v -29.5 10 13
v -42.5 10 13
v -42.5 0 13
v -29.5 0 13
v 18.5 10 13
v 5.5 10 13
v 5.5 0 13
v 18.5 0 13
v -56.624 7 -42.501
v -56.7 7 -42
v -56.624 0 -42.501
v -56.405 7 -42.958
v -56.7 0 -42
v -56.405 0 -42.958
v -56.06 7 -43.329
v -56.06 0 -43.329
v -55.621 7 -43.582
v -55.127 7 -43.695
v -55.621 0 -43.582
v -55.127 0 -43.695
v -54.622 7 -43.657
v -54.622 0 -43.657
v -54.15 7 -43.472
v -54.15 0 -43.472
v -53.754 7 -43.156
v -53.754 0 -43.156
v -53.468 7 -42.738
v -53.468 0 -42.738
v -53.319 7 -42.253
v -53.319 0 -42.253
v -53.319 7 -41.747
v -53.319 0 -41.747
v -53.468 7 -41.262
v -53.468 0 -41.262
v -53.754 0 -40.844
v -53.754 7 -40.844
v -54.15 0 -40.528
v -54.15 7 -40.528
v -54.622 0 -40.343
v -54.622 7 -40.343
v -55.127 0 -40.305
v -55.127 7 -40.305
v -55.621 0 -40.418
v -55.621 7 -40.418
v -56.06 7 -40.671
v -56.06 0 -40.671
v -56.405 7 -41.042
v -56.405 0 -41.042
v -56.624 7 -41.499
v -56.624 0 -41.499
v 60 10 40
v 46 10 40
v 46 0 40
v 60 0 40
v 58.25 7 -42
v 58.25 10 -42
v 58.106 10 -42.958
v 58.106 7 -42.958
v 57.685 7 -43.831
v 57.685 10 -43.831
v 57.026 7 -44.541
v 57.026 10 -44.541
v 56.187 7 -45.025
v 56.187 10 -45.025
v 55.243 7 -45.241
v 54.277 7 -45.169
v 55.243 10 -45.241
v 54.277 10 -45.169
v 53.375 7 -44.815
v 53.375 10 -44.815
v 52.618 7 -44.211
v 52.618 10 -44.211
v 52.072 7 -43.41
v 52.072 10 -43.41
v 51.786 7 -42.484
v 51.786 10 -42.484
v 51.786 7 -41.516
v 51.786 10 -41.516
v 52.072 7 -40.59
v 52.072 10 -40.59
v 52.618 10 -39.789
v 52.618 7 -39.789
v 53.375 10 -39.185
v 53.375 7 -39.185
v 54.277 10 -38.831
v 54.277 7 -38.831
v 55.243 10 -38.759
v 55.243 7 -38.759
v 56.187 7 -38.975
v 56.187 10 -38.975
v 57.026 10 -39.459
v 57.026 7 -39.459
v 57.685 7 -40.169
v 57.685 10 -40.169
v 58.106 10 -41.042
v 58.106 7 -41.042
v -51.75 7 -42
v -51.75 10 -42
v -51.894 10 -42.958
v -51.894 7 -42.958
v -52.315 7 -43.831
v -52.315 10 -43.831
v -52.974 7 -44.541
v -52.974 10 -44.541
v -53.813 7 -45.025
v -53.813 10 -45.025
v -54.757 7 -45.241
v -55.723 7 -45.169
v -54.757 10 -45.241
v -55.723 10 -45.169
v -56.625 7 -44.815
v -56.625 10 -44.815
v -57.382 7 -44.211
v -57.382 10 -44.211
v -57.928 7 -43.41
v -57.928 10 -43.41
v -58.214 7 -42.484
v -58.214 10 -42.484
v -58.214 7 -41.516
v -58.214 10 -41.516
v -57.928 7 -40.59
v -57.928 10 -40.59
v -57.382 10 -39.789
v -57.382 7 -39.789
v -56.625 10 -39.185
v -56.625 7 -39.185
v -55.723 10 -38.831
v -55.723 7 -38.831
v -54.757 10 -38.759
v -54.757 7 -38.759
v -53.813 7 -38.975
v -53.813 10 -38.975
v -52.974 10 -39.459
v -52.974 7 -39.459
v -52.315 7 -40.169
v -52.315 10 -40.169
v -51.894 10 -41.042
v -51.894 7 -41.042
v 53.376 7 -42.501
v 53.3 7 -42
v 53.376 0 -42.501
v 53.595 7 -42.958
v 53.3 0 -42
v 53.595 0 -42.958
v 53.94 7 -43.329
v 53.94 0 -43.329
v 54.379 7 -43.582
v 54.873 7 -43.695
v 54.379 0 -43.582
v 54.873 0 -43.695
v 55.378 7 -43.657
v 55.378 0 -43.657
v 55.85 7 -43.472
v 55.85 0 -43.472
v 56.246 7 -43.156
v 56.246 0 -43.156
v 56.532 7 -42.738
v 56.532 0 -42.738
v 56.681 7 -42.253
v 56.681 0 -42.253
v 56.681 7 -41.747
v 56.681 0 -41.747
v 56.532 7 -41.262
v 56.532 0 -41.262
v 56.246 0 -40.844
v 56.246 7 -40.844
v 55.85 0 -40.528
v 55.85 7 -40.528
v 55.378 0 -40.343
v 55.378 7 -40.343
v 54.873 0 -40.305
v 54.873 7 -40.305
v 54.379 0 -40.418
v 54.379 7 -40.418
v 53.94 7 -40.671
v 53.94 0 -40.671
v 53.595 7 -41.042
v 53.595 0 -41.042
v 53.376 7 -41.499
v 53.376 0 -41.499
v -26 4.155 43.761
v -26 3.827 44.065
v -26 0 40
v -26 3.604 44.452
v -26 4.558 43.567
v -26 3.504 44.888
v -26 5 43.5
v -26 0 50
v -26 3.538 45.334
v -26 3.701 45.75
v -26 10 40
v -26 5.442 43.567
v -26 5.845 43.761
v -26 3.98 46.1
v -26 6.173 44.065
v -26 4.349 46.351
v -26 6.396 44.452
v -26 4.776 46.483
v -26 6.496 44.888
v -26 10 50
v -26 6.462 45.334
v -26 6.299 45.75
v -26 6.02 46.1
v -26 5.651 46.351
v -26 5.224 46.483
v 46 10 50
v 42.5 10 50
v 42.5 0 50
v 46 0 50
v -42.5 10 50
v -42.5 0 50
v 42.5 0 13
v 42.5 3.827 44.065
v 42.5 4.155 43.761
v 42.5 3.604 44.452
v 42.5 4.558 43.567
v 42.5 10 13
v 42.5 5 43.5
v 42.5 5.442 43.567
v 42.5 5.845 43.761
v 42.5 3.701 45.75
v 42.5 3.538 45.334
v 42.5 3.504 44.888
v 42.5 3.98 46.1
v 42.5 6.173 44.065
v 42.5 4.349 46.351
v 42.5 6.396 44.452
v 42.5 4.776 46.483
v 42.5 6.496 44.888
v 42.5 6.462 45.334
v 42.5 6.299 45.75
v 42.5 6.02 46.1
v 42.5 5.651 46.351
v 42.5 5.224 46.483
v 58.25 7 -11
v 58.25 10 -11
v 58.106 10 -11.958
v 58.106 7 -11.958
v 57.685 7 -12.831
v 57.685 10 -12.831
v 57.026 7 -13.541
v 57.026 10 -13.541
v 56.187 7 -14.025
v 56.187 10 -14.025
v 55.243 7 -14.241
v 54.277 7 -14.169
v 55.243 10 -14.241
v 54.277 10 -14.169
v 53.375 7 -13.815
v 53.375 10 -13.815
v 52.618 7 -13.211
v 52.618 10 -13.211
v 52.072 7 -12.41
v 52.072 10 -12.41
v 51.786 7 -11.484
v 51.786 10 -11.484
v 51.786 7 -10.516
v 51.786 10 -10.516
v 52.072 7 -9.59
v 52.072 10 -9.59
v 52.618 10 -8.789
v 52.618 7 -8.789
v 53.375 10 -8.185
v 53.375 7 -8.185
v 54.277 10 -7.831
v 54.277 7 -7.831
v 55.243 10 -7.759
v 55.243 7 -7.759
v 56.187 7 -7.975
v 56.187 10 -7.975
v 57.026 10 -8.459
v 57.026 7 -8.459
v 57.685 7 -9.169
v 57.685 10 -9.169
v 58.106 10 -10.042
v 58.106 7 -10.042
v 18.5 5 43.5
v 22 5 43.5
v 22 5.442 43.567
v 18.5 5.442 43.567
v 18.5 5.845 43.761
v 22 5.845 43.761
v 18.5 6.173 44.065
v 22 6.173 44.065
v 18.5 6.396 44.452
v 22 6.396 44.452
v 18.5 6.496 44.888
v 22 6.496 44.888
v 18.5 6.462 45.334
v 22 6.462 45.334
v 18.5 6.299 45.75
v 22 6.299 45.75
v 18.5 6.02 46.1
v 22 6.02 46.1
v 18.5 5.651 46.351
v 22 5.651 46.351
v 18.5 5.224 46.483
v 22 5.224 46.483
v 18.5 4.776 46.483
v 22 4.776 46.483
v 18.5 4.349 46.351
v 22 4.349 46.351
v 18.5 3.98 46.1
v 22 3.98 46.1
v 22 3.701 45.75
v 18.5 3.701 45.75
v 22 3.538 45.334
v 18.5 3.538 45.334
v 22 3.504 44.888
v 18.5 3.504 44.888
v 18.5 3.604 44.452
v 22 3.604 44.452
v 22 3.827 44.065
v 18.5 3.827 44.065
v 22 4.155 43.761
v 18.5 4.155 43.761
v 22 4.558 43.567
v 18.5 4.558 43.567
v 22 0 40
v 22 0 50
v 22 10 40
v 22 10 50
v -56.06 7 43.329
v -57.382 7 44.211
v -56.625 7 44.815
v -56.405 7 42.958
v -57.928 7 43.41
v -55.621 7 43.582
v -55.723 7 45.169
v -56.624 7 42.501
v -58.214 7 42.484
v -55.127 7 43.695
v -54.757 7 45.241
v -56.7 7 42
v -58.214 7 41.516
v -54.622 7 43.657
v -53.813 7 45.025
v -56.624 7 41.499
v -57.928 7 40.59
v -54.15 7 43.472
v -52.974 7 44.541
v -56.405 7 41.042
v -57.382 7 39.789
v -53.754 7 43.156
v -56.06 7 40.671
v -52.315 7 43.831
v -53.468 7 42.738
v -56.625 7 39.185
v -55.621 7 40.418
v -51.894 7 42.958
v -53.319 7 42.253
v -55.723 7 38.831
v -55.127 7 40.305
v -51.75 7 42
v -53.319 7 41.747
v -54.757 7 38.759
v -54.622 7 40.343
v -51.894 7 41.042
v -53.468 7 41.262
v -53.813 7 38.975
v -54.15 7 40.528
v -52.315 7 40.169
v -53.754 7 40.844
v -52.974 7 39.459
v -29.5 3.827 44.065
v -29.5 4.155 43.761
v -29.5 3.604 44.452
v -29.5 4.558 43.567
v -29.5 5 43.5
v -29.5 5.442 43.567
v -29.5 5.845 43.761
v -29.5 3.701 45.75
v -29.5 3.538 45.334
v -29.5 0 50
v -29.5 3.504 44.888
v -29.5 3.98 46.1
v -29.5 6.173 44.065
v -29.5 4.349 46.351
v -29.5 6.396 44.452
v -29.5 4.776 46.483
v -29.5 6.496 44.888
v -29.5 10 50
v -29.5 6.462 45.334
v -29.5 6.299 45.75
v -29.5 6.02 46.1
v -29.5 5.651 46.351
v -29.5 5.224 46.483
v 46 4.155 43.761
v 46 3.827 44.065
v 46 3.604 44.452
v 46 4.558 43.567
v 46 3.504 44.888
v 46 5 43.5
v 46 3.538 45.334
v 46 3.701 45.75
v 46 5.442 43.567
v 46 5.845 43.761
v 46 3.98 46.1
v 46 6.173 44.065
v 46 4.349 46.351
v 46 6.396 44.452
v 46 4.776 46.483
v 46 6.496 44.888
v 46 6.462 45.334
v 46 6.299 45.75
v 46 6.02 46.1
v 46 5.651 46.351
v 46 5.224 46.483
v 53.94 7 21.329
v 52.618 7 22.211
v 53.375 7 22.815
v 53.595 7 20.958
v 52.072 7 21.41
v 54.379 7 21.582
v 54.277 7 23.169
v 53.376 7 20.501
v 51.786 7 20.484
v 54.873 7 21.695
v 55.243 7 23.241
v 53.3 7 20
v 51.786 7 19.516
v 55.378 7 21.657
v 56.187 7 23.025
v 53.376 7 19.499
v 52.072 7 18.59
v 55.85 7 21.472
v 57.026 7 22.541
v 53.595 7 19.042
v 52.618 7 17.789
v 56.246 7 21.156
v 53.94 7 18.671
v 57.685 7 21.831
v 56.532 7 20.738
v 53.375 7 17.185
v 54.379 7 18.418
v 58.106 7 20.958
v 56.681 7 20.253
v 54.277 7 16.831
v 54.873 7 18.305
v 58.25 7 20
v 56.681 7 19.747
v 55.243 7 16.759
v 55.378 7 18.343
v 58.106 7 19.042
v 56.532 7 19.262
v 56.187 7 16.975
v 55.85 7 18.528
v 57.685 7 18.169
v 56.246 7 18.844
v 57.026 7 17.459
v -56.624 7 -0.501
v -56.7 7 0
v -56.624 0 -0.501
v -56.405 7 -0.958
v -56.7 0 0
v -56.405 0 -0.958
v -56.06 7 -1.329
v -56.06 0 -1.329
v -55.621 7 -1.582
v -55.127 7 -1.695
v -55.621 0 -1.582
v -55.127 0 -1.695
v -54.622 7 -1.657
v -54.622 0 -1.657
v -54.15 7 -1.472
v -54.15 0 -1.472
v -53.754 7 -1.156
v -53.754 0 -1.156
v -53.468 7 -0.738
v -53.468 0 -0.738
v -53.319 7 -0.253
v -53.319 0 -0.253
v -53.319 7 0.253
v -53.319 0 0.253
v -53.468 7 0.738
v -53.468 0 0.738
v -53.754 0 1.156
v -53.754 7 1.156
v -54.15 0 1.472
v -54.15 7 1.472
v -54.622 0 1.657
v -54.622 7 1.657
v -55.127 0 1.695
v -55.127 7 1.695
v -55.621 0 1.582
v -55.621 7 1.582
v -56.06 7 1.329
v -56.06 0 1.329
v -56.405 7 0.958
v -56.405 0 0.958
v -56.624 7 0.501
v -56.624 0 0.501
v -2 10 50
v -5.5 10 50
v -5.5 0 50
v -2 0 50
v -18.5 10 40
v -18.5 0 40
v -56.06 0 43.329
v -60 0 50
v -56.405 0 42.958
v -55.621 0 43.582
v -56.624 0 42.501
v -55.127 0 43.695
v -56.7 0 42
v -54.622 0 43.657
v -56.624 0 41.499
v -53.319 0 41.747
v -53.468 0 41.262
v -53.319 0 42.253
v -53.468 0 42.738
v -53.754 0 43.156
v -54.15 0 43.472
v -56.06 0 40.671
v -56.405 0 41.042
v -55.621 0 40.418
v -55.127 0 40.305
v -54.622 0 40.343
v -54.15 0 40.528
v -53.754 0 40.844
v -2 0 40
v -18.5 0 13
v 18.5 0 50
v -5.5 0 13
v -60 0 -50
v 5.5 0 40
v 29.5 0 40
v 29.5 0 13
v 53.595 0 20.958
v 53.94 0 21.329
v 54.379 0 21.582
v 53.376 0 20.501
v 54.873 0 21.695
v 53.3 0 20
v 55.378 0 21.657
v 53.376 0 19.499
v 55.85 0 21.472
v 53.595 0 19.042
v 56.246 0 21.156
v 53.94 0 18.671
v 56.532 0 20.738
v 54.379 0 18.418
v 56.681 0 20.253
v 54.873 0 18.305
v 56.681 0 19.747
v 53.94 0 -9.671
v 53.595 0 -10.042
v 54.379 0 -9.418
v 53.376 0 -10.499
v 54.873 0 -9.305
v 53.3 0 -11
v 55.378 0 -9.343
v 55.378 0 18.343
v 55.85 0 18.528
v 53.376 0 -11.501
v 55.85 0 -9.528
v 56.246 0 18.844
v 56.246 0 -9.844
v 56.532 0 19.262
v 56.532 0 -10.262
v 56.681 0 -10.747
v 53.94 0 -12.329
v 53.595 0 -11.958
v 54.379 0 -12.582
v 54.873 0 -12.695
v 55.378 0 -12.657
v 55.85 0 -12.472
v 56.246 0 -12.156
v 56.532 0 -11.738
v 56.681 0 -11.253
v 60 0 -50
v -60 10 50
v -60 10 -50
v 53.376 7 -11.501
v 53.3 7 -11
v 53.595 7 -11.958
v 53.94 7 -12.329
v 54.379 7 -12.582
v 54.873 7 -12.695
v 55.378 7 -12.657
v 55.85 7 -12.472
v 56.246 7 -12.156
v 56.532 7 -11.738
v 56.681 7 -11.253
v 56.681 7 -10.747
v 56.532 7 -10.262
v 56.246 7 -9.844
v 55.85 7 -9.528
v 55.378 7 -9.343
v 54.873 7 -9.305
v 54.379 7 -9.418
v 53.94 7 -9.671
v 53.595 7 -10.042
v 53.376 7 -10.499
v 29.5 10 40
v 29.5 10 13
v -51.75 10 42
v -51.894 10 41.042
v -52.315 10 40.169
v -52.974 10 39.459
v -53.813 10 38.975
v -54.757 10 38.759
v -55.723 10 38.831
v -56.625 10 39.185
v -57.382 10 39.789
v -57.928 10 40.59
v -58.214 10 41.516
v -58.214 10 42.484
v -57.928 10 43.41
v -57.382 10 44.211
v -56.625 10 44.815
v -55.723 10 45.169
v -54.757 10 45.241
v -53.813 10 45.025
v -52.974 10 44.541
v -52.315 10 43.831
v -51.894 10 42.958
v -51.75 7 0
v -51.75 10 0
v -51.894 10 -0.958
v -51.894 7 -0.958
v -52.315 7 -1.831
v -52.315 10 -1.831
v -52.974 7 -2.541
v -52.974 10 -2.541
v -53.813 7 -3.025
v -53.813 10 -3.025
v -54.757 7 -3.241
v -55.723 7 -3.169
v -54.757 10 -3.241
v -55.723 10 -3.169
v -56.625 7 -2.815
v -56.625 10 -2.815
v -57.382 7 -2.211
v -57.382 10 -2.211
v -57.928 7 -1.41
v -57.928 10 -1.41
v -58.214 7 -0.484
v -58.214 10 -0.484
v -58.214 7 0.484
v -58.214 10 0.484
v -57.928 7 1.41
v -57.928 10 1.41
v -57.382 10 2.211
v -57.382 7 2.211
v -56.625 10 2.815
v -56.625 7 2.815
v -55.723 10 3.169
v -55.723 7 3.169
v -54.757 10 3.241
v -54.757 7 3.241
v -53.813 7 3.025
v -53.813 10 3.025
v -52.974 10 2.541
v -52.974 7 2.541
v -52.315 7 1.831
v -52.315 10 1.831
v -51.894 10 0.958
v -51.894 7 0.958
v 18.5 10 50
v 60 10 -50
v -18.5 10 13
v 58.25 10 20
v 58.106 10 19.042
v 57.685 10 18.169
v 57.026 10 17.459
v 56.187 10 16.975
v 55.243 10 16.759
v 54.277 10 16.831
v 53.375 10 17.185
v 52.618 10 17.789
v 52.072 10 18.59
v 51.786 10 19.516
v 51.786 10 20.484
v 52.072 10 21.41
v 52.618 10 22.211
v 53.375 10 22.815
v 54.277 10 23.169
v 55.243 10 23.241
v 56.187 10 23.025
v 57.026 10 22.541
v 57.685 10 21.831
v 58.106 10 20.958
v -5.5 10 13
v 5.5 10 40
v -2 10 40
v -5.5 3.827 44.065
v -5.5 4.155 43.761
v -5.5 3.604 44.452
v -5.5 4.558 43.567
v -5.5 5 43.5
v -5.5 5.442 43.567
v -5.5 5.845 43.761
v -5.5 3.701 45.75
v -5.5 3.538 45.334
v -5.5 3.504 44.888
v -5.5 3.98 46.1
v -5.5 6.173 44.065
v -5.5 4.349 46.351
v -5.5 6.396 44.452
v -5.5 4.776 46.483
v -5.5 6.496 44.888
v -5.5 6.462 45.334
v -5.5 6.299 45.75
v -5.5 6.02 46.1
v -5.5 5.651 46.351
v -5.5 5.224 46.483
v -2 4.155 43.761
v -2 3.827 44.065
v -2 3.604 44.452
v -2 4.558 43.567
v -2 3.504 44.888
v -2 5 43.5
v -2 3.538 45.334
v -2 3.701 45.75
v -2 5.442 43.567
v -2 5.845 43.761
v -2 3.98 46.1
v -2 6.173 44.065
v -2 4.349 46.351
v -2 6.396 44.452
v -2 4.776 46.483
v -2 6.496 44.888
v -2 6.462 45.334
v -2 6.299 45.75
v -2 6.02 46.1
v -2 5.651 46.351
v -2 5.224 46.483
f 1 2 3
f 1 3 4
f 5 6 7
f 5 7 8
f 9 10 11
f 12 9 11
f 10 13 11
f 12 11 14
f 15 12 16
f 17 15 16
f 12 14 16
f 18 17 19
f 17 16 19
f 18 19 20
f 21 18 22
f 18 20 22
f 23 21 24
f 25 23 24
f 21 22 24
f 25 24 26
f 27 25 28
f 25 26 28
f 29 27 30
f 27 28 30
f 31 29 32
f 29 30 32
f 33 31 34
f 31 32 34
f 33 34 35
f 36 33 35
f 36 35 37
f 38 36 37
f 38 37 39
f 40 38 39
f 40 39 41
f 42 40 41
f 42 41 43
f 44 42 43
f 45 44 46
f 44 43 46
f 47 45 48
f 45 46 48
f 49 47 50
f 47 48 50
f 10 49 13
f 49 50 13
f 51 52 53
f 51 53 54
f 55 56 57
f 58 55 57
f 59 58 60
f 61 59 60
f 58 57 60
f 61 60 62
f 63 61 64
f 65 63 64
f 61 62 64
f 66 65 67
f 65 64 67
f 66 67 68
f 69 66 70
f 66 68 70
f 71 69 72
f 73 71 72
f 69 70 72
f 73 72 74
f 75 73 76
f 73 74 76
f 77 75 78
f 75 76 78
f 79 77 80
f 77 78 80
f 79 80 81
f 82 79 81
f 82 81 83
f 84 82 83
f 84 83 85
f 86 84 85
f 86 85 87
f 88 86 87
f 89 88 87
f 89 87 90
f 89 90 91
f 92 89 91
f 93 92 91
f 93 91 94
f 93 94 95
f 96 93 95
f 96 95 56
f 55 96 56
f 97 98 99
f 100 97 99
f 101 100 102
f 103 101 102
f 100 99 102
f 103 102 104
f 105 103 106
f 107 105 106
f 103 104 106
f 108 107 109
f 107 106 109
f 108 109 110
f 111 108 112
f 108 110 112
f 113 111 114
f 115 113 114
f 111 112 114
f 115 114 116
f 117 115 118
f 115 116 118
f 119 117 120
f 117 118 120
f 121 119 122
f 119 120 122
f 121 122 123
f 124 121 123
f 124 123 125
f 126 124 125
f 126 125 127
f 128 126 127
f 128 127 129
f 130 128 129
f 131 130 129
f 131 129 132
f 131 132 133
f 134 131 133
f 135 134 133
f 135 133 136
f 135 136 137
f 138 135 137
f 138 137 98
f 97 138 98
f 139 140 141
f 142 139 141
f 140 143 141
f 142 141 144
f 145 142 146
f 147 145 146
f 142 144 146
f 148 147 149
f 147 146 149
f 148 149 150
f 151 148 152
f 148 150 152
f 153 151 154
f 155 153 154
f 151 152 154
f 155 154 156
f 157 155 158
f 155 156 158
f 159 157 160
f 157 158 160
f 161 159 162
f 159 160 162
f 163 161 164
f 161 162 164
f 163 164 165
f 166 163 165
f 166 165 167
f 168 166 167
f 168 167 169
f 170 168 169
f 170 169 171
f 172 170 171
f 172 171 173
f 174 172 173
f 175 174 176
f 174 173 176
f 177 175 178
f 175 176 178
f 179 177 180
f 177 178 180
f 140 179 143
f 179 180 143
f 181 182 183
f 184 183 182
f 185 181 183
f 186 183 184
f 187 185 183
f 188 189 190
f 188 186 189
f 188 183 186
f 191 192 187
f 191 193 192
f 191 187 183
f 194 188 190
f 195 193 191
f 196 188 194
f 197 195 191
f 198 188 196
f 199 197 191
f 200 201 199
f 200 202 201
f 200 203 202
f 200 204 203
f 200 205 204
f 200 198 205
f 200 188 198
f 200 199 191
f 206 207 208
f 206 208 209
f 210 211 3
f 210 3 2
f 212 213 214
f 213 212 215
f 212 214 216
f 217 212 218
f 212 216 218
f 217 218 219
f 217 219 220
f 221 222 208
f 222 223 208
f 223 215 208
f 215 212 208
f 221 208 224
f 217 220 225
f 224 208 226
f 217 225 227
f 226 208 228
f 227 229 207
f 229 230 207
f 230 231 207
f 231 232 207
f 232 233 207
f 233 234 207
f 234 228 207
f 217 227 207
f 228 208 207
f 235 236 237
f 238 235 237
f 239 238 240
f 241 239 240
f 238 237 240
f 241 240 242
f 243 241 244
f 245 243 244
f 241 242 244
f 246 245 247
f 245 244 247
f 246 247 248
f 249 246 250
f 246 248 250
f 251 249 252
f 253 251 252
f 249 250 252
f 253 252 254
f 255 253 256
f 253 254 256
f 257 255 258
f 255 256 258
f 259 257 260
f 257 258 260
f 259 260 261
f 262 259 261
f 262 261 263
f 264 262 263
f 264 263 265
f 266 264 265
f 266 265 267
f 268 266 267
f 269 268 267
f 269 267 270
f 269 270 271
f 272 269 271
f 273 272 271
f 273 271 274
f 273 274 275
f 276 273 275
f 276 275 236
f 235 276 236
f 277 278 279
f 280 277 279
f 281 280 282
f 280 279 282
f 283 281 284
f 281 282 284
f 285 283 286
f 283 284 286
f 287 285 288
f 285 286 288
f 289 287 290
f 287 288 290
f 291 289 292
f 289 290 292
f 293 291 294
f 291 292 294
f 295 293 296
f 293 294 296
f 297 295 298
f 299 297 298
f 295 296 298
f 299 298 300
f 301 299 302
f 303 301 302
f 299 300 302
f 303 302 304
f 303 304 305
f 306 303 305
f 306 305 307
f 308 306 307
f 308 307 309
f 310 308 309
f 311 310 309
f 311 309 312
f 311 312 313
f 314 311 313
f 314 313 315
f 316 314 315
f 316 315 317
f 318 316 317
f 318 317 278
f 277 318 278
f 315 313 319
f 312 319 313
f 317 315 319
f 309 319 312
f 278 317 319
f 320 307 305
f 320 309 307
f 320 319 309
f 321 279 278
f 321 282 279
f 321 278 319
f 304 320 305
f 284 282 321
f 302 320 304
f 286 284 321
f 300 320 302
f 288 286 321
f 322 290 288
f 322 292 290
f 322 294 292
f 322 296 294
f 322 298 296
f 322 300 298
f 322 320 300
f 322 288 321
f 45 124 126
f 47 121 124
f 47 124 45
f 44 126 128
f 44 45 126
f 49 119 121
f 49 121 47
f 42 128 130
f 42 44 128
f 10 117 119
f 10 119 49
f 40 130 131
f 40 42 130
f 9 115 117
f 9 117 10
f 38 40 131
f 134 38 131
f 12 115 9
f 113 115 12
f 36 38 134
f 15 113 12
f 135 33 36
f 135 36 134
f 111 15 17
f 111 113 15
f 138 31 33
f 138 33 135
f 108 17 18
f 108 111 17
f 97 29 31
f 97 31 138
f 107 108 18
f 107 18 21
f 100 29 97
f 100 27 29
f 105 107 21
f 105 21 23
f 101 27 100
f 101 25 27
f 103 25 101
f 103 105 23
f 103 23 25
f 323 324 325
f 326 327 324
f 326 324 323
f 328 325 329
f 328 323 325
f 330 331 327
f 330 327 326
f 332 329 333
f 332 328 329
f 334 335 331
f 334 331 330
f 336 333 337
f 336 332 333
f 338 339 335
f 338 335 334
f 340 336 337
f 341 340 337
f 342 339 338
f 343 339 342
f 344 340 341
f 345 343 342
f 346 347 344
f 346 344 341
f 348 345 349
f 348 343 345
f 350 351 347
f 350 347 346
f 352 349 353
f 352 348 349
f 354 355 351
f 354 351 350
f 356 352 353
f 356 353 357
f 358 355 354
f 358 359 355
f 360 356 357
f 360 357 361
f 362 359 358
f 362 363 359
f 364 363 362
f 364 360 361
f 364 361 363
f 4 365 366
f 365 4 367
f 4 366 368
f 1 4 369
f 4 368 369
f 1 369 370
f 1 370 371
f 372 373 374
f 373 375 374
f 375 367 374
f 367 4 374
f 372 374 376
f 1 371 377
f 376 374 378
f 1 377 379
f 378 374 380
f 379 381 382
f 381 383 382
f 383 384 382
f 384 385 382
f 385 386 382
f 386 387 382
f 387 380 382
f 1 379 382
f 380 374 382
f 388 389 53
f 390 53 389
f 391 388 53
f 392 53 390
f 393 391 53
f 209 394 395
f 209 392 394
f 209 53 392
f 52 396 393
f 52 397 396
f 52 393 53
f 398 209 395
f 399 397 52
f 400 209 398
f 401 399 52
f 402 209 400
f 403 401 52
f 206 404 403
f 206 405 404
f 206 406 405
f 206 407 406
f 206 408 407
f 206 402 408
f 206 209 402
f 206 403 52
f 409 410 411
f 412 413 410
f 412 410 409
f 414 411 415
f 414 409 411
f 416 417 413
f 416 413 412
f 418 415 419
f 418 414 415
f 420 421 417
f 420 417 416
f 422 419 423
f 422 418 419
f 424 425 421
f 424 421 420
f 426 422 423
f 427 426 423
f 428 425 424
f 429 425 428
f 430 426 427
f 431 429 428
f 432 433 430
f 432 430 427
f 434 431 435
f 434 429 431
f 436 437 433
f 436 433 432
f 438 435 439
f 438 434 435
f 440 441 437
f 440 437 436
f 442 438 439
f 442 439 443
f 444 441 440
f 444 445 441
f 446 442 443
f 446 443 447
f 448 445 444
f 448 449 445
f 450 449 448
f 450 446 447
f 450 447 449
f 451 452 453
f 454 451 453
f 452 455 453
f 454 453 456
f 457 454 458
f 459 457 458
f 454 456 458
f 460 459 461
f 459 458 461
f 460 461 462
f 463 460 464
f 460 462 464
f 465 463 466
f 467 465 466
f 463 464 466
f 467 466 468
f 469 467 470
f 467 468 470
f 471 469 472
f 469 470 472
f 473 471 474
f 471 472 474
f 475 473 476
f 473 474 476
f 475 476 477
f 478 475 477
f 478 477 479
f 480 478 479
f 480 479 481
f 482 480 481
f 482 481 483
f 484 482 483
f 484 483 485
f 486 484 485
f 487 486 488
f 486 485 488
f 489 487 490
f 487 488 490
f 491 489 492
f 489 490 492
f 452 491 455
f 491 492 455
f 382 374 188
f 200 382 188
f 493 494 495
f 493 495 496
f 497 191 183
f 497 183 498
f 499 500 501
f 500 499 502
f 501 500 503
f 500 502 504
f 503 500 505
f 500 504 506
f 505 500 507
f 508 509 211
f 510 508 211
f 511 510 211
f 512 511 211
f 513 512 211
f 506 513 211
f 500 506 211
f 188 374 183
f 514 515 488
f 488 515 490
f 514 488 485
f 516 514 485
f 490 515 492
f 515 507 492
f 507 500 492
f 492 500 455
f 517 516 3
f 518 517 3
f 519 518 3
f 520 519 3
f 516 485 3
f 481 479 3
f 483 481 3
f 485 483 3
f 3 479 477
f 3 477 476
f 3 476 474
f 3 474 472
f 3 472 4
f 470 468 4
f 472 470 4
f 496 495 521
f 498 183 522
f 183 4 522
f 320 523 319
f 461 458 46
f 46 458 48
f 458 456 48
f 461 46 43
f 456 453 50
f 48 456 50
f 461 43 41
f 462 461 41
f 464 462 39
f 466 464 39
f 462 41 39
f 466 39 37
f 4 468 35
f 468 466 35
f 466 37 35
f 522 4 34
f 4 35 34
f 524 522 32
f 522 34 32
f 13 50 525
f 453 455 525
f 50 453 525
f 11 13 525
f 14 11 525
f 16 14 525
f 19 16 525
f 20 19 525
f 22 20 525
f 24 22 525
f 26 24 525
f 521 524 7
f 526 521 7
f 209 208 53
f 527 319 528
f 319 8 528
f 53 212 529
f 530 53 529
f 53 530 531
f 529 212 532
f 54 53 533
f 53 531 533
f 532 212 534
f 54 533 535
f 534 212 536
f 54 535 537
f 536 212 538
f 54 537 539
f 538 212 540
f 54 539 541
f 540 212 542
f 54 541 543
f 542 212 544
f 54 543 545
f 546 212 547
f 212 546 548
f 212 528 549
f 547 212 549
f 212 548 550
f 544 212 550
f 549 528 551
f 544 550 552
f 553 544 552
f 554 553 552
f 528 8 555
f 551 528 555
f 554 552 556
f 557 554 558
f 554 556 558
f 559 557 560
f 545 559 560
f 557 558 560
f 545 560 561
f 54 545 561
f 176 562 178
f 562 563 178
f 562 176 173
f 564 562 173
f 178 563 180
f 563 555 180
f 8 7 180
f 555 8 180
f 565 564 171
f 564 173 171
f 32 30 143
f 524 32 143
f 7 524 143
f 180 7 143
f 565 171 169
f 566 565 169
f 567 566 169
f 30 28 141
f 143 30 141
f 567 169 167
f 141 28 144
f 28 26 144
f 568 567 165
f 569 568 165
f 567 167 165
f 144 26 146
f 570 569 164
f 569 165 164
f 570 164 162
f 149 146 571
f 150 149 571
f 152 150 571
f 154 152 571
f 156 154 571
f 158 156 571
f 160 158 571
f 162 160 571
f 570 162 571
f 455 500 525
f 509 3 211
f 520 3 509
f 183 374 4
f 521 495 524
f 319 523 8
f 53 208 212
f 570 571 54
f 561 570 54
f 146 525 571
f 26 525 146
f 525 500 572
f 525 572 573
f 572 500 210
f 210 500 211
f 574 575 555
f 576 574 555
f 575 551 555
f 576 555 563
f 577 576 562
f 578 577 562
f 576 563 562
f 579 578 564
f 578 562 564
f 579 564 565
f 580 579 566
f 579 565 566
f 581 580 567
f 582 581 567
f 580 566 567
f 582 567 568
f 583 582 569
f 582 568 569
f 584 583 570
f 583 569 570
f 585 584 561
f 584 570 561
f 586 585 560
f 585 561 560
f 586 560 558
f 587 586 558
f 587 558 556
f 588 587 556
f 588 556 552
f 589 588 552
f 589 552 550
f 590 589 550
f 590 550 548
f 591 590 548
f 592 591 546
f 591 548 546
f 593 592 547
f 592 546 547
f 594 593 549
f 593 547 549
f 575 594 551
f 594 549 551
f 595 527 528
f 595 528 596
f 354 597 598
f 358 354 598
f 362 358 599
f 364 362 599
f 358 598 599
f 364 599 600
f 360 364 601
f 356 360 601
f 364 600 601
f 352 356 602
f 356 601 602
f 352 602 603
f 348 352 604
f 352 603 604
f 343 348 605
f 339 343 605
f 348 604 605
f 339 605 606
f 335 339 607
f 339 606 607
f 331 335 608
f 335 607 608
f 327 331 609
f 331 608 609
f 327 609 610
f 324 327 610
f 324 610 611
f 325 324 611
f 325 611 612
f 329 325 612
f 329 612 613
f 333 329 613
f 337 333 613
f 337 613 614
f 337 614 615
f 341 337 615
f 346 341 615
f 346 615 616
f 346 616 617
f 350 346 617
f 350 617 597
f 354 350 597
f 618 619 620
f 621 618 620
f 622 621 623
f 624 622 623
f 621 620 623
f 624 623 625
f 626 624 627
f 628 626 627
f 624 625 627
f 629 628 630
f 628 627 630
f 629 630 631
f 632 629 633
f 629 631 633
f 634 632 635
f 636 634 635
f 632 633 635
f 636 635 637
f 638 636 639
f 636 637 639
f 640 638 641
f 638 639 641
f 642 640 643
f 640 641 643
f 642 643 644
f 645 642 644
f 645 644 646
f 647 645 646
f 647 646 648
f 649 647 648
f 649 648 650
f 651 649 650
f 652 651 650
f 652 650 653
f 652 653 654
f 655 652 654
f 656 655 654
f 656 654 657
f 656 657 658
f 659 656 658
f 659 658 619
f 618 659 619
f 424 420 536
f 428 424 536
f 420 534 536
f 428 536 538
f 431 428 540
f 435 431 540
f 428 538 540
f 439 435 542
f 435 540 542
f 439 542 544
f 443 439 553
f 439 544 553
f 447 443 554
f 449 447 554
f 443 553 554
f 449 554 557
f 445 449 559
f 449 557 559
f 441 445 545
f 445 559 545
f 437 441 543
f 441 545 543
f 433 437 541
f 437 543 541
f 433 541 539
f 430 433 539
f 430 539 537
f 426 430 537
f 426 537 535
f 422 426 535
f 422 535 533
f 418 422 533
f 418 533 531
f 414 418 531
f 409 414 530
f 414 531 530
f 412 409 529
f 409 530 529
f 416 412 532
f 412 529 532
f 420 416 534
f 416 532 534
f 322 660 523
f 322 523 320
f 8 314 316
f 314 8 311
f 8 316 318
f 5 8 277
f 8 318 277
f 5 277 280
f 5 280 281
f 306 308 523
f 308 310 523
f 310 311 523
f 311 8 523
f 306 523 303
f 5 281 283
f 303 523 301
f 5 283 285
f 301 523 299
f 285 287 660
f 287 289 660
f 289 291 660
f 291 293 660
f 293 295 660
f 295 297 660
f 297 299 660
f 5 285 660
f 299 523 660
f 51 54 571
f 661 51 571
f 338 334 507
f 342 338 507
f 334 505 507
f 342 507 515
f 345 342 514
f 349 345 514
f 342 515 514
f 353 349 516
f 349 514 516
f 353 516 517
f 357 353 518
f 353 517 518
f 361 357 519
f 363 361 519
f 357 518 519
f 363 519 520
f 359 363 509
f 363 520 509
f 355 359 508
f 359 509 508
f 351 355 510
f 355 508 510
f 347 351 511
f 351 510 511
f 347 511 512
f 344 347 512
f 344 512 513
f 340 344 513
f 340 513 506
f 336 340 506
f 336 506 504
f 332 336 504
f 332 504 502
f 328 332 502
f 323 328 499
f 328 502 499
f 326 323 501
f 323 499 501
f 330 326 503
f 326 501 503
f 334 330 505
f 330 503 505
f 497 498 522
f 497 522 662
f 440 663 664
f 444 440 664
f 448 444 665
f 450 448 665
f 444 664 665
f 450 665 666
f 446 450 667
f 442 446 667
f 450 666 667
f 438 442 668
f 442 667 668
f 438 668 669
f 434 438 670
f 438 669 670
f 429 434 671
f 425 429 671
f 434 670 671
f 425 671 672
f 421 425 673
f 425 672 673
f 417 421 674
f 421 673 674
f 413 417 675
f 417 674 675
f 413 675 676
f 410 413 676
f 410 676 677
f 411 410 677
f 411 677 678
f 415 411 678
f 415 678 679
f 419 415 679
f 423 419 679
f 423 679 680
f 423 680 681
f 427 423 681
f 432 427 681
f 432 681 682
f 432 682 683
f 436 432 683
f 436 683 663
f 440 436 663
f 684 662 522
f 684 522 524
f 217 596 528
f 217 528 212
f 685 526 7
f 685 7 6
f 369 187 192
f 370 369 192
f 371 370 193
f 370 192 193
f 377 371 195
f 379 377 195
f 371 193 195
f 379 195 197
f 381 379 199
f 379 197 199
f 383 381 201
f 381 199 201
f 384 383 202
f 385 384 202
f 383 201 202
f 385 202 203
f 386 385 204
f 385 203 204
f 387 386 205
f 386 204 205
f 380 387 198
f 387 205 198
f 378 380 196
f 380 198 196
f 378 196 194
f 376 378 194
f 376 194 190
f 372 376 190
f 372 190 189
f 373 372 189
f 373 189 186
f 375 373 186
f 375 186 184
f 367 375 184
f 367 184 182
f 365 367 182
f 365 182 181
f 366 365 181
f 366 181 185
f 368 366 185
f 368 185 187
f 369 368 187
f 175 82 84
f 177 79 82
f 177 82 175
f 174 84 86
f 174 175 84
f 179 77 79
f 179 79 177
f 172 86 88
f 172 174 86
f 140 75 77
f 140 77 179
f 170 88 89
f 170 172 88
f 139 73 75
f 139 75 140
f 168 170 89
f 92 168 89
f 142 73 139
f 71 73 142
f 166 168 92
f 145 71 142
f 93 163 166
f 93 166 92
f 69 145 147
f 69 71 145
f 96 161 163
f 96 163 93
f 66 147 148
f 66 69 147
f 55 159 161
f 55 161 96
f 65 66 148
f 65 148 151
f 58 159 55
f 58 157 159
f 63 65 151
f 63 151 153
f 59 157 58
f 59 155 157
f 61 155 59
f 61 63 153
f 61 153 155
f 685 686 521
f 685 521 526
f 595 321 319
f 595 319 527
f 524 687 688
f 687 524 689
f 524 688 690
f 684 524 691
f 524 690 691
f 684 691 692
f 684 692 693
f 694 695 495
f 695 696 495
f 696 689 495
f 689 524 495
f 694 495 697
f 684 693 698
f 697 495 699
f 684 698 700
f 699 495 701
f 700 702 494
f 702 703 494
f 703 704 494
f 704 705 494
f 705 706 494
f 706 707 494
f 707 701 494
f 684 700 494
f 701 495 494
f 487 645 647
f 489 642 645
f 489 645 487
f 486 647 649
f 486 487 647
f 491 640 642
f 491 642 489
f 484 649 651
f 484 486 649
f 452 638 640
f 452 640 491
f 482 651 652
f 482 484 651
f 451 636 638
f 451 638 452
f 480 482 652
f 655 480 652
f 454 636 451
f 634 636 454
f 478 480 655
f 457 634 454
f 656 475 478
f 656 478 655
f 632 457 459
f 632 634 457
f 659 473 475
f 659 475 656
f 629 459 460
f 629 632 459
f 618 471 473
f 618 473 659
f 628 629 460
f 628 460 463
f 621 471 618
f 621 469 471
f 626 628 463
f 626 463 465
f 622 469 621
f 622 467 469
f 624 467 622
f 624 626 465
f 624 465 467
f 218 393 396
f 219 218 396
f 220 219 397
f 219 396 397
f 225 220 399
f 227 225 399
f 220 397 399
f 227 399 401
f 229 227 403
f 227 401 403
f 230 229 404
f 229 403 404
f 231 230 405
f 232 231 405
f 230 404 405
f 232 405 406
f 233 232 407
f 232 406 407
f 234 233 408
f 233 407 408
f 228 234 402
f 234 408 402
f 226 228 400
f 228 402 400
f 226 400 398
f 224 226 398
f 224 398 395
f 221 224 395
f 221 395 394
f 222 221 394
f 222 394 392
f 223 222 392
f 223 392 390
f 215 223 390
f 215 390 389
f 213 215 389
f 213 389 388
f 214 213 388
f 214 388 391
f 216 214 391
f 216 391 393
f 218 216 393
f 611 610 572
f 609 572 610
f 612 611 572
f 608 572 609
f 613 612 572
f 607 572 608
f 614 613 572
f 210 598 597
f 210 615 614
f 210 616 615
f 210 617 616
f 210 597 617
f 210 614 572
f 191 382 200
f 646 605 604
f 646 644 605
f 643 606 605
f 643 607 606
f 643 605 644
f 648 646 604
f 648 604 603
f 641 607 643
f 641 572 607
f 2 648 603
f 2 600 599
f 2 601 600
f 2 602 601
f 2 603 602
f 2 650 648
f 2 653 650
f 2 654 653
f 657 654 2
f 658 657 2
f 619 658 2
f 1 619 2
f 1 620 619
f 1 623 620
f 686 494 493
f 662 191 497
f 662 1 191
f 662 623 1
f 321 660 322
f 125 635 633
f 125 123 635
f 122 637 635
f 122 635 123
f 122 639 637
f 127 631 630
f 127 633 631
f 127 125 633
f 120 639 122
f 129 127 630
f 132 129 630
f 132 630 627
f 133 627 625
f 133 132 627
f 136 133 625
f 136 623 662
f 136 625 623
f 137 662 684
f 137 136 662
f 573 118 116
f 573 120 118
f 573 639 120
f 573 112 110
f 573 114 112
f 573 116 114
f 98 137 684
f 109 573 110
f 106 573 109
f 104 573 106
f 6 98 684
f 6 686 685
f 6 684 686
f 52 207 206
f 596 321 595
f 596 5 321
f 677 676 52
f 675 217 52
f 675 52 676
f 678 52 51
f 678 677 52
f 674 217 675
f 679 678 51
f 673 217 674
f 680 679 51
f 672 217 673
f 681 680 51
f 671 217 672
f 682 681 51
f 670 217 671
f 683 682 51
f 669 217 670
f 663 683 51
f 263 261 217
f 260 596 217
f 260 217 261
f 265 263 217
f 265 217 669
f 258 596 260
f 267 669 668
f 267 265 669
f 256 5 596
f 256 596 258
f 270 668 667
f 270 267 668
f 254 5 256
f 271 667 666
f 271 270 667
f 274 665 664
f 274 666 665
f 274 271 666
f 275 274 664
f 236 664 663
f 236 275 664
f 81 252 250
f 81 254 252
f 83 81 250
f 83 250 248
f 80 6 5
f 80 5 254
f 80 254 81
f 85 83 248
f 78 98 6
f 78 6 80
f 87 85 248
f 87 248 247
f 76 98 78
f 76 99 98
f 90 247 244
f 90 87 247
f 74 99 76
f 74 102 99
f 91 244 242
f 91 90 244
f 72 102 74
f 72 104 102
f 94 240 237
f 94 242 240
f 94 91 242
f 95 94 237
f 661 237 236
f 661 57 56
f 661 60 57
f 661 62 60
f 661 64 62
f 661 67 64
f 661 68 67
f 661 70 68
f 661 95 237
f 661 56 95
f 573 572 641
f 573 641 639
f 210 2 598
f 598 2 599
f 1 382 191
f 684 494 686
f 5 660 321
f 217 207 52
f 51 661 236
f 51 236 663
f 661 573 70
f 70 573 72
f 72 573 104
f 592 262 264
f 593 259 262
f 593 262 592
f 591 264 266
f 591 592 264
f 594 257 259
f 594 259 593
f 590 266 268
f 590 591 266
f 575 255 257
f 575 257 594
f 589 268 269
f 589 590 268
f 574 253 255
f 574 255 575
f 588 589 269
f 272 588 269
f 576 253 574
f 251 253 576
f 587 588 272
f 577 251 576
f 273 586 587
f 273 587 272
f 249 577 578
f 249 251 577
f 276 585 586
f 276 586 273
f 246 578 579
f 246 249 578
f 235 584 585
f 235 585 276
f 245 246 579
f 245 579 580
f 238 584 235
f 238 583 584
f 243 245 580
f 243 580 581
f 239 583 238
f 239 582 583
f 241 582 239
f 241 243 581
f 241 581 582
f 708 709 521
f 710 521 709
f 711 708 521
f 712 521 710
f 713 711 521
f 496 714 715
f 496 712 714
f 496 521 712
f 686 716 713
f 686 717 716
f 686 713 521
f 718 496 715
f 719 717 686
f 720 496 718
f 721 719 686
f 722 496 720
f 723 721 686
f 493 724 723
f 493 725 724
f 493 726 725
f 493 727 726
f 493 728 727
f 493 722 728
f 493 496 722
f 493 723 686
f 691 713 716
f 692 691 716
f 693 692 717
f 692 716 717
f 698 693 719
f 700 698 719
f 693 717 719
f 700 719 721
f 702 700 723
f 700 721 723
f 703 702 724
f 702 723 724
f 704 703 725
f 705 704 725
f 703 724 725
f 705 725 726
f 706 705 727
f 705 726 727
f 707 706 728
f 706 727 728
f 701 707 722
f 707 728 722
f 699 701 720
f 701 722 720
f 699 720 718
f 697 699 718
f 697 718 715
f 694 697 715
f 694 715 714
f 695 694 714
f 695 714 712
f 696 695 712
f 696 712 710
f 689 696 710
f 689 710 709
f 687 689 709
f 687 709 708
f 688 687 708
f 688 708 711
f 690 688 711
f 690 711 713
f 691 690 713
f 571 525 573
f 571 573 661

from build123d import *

# Parameters (mm, degrees)
SKETCH1_W                     = 120
SKETCH1_H                     = 100
BOSS_EXTRUDE1_DEPTH           = 10
SKETCH2_W                     = 13
SKETCH2_H                     = 20
CUT_EXTRUDE1_DEPTH            = 37
SKETCH3_W                     = 14
SKETCH3_H                     = 10
SKETCH3_W_2                   = 7.5
CUT_EXTRUDE4_DEPTH            = 10
SKETCH10_R                    = 1.5
CUT_EXTRUDE5_DEPTH            = 75.5
CBORE_FOR_M3_SHCS_D           = 3.4
CBORE_FOR_M3_SHCS_DEPTH       = 23
CBORE_FOR_M3_SHCS_CBORE_D     = 6.5
CBORE_FOR_M3_SHCS_CBORE_DEPTH = 3
CBORE_FOR_M3_SHCS_TIP         = 1.021463052


with BuildPart() as part:
    # Sketch1 → Boss-Extrude1 (new body)
    with BuildSketch(Plane(origin=(0, 0, 0), x_dir=(1, 0, 0), z_dir=(0, 1, 0))):
        Rectangle(SKETCH1_W, SKETCH1_H)
    extrude(amount=BOSS_EXTRUDE1_DEPTH)

    # Sketch2 → Cut-Extrude1 (cut)
    with BuildSketch(Plane.XY.offset(50)):
        with Locations((-36, 0)):
            Rectangle(SKETCH2_W, SKETCH2_H)
        with Locations((-12, 0)):
            Rectangle(SKETCH2_W, SKETCH2_H)
        with Locations((12, 0)):
            Rectangle(SKETCH2_W, SKETCH2_H)
        with Locations((36, 0)):
            Rectangle(SKETCH2_W, SKETCH2_H)
    extrude(amount=-CUT_EXTRUDE1_DEPTH, mode=Mode.SUBTRACT)

    # Sketch3 → Cut-Extrude4 (cut)
    with BuildSketch(Plane.XY.offset(50)):
        with Locations((53, 5)):
            Rectangle(SKETCH3_W, SKETCH3_H)
        with Locations((25.75, 5)):
            Rectangle(SKETCH3_W_2, SKETCH3_H)
        with Locations((1.75, 5)):
            Rectangle(SKETCH3_W_2, SKETCH3_H)
        with Locations((-22.25, 5)):
            Rectangle(SKETCH3_W_2, SKETCH3_H)
    extrude(amount=-CUT_EXTRUDE4_DEPTH, mode=Mode.SUBTRACT)

    # Sketch10 → Cut-Extrude5 (cut)
    with BuildSketch(Plane(origin=(46, 0, 0), x_dir=(0, 0, -1), z_dir=(1, 0, 0))):
        with Locations((-45, 5)):
            Circle(SKETCH10_R)
    extrude(amount=-CUT_EXTRUDE5_DEPTH, mode=Mode.SUBTRACT)

    # CBORE for M3 SHCS
    with Locations(Plane(origin=(-676.293536786, 10, -1323.282701689), x_dir=(1, 0, 0), z_dir=(0, 1, 0))):
        with Locations((731.293536786, -1281.282701689), (731.293536786, -1343.282701689), (621.293536786, -1281.282701689), (621.293536786, -1365.282701689), (621.293536786, -1323.282701689), (731.293536786, -1312.282701689)):
            CounterBoreHole(CBORE_FOR_M3_SHCS_D / 2, CBORE_FOR_M3_SHCS_CBORE_D / 2, CBORE_FOR_M3_SHCS_CBORE_DEPTH, depth=CBORE_FOR_M3_SHCS_DEPTH)
            with Locations((0, 0, -(CBORE_FOR_M3_SHCS_DEPTH + CBORE_FOR_M3_SHCS_TIP / 2))):  # 118° drill point
                Cone(0, CBORE_FOR_M3_SHCS_D / 2, CBORE_FOR_M3_SHCS_TIP, mode=Mode.SUBTRACT)


solid = part.part
